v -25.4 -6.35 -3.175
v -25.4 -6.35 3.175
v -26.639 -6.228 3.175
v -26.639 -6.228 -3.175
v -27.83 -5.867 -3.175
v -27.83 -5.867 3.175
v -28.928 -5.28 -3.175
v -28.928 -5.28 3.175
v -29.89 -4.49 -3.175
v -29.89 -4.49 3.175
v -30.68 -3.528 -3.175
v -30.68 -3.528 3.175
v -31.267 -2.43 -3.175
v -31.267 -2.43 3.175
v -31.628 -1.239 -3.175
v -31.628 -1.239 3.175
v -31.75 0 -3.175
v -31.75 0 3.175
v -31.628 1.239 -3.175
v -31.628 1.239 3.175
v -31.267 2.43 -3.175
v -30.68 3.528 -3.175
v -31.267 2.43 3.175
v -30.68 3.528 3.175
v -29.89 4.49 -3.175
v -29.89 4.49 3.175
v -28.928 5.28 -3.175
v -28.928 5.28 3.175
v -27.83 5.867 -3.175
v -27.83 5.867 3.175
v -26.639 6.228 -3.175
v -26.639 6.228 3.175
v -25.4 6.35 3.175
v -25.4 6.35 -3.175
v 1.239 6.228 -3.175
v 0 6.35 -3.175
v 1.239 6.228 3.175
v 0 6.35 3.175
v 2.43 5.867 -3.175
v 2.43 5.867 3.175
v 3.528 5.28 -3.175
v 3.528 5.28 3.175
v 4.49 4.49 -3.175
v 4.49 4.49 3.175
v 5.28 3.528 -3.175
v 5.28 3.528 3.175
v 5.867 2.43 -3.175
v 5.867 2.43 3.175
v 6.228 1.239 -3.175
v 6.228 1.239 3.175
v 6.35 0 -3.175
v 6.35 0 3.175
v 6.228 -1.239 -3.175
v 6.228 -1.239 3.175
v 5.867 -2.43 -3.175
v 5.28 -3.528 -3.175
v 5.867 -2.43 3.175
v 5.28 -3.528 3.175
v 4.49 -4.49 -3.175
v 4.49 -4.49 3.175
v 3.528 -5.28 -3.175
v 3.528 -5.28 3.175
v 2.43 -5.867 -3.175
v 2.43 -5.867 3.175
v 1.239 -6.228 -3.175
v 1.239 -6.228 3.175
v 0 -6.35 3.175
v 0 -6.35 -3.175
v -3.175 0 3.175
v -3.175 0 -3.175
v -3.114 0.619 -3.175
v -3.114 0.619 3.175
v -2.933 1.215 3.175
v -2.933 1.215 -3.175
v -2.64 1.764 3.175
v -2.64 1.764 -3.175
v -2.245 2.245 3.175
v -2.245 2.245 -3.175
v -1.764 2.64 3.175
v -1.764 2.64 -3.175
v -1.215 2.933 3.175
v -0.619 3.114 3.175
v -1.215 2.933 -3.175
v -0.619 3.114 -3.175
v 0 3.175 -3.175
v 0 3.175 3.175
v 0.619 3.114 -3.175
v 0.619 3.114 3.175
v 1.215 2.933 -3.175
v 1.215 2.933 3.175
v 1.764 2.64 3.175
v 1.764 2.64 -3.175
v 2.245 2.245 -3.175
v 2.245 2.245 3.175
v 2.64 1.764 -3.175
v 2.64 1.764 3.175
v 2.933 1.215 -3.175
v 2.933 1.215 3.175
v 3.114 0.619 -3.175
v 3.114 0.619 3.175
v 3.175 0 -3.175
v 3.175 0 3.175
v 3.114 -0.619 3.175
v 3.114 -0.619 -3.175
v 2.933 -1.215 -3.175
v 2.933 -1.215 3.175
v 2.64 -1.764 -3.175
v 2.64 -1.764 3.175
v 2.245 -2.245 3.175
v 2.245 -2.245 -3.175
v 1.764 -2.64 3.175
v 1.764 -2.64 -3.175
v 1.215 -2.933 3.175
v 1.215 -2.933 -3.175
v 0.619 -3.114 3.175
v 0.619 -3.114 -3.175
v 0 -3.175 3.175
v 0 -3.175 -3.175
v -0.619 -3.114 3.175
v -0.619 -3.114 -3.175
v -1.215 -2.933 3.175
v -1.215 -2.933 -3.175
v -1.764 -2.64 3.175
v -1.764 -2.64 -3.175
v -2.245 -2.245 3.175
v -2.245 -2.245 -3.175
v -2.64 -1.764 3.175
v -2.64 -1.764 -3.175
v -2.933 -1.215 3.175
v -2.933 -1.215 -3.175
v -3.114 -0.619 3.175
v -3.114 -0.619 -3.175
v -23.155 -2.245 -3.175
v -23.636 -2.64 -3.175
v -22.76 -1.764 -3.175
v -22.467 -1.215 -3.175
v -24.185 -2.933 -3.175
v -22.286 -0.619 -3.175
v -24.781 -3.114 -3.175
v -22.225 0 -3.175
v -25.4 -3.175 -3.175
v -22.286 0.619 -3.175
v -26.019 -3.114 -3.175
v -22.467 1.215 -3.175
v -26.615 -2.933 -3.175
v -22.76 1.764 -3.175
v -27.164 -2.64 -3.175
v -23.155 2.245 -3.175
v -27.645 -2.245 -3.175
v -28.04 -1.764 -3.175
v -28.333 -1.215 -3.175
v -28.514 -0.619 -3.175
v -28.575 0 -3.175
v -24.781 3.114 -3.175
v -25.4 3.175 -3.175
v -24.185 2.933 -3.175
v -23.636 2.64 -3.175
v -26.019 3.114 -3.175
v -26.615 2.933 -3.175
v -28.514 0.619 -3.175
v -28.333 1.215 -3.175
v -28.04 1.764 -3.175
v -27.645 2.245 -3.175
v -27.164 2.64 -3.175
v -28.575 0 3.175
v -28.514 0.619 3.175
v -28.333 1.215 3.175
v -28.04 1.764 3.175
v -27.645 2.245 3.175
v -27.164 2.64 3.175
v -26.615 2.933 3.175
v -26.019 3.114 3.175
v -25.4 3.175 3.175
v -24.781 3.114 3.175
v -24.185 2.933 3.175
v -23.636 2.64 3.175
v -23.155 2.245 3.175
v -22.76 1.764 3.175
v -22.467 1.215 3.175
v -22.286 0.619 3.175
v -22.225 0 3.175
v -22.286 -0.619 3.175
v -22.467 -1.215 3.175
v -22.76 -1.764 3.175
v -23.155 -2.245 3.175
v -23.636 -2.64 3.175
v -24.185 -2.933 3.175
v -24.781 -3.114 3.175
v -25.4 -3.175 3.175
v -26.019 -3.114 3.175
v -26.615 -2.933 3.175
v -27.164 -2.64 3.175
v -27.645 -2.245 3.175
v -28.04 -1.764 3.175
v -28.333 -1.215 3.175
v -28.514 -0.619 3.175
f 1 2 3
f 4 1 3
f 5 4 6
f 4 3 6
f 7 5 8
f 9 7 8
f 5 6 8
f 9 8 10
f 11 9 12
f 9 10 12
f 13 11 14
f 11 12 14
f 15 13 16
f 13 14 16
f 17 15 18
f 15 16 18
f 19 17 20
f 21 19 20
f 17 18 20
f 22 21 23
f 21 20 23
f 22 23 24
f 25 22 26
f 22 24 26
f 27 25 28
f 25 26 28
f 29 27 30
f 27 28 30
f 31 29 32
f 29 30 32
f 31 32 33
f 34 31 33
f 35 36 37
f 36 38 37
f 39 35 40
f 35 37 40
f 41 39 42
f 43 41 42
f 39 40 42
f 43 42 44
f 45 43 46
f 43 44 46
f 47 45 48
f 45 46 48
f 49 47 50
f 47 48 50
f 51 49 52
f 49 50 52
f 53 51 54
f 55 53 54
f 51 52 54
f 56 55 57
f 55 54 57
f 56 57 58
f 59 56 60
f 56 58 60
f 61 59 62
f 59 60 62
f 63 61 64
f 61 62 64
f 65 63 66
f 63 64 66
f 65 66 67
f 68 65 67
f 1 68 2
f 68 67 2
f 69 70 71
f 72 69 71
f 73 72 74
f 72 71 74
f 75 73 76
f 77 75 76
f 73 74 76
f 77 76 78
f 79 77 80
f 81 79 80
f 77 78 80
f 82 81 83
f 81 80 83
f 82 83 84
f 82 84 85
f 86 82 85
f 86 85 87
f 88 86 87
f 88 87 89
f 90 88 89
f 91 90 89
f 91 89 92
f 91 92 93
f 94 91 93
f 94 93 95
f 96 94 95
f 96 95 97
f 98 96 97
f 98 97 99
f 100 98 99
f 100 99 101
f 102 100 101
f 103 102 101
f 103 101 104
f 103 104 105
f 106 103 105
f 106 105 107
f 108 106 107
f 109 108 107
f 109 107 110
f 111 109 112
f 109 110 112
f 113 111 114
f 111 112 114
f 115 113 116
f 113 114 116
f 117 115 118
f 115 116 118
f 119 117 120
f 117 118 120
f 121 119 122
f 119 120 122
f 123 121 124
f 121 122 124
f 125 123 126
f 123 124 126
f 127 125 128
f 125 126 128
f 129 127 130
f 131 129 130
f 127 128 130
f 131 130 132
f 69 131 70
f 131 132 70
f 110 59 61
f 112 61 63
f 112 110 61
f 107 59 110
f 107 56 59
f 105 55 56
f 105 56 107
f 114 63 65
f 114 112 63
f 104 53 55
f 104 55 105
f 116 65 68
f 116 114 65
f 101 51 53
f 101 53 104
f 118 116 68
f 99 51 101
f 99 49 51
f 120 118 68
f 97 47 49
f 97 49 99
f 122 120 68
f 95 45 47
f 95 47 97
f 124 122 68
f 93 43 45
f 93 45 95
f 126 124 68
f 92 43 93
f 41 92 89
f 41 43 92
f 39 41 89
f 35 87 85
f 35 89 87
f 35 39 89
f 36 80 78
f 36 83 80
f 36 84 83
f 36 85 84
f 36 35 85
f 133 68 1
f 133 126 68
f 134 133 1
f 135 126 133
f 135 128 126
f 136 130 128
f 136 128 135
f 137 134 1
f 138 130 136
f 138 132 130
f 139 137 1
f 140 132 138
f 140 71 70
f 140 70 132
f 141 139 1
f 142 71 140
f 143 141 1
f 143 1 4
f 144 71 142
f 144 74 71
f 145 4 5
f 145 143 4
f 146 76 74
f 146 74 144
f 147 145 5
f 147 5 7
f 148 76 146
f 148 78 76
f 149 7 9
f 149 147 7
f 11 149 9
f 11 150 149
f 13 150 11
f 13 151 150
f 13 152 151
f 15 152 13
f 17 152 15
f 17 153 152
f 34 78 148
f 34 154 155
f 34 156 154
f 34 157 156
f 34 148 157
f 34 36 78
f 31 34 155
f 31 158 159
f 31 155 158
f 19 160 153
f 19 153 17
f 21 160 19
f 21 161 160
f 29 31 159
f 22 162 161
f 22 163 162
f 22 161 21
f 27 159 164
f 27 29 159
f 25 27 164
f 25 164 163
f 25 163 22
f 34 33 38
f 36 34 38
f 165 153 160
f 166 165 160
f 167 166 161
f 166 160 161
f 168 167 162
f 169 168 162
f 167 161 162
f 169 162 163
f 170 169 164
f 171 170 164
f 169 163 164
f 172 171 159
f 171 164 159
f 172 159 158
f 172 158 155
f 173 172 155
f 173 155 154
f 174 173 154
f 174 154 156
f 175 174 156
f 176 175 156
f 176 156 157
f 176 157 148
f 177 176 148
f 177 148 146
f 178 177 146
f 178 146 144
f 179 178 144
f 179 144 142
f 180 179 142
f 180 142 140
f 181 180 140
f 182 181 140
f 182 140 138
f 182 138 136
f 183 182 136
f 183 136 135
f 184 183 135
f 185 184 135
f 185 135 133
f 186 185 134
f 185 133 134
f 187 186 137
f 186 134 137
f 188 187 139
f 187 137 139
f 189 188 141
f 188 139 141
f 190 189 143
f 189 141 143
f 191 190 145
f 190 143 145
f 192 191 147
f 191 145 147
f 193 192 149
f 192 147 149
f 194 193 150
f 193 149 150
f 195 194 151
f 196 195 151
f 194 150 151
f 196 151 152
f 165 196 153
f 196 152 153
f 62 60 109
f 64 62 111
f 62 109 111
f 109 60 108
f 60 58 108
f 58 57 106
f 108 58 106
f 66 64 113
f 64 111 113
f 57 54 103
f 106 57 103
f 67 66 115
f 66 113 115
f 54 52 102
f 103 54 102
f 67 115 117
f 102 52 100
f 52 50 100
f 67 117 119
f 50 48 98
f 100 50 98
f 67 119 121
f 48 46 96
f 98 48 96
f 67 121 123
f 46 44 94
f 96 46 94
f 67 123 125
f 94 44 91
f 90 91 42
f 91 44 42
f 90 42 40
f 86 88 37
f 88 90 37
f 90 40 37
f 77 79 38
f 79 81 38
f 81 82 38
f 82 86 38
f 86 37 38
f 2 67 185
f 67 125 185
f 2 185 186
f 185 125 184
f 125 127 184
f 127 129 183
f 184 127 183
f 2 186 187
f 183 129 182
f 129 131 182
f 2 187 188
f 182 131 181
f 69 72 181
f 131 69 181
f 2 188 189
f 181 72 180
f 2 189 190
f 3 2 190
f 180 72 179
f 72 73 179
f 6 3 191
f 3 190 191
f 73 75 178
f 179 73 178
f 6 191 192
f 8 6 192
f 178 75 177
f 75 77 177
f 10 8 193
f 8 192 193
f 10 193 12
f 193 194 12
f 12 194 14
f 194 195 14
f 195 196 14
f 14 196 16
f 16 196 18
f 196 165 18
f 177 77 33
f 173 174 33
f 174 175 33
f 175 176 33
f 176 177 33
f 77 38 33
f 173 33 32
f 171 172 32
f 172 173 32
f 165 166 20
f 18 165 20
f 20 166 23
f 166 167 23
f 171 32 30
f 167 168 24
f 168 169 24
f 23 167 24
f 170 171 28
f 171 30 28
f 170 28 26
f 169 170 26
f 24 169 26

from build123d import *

# Parameters (mm, degrees)
BASE_EXTRUDE_DEPTH              = 3.175
F_1_4_0_250000_DIAMETER_HOLE1_D = 6.35


with BuildPart() as part:
    # profile → Base-Extrude (new body, symmetric)
    with BuildSketch(Plane.XY):
        with BuildLine():
            Line((-25.4, 6.35), (0, 6.35))
            ThreePointArc((0, 6.35), (6.35, 0), (0, -6.35))
            Line((0, -6.35), (-25.4, -6.35))
            ThreePointArc((-25.4, -6.35), (-31.75, 0), (-25.4, 6.35))
        make_face()
    extrude(amount=BASE_EXTRUDE_DEPTH, both=True)

    # 1/4 (0.250000) Diameter Hole1 (through all)
    with Locations(Plane.XY.offset(3.175)):
        with Locations((-25.4, 0), (0, 0)):
            Hole(F_1_4_0_250000_DIAMETER_HOLE1_D / 2)


solid = part.part
